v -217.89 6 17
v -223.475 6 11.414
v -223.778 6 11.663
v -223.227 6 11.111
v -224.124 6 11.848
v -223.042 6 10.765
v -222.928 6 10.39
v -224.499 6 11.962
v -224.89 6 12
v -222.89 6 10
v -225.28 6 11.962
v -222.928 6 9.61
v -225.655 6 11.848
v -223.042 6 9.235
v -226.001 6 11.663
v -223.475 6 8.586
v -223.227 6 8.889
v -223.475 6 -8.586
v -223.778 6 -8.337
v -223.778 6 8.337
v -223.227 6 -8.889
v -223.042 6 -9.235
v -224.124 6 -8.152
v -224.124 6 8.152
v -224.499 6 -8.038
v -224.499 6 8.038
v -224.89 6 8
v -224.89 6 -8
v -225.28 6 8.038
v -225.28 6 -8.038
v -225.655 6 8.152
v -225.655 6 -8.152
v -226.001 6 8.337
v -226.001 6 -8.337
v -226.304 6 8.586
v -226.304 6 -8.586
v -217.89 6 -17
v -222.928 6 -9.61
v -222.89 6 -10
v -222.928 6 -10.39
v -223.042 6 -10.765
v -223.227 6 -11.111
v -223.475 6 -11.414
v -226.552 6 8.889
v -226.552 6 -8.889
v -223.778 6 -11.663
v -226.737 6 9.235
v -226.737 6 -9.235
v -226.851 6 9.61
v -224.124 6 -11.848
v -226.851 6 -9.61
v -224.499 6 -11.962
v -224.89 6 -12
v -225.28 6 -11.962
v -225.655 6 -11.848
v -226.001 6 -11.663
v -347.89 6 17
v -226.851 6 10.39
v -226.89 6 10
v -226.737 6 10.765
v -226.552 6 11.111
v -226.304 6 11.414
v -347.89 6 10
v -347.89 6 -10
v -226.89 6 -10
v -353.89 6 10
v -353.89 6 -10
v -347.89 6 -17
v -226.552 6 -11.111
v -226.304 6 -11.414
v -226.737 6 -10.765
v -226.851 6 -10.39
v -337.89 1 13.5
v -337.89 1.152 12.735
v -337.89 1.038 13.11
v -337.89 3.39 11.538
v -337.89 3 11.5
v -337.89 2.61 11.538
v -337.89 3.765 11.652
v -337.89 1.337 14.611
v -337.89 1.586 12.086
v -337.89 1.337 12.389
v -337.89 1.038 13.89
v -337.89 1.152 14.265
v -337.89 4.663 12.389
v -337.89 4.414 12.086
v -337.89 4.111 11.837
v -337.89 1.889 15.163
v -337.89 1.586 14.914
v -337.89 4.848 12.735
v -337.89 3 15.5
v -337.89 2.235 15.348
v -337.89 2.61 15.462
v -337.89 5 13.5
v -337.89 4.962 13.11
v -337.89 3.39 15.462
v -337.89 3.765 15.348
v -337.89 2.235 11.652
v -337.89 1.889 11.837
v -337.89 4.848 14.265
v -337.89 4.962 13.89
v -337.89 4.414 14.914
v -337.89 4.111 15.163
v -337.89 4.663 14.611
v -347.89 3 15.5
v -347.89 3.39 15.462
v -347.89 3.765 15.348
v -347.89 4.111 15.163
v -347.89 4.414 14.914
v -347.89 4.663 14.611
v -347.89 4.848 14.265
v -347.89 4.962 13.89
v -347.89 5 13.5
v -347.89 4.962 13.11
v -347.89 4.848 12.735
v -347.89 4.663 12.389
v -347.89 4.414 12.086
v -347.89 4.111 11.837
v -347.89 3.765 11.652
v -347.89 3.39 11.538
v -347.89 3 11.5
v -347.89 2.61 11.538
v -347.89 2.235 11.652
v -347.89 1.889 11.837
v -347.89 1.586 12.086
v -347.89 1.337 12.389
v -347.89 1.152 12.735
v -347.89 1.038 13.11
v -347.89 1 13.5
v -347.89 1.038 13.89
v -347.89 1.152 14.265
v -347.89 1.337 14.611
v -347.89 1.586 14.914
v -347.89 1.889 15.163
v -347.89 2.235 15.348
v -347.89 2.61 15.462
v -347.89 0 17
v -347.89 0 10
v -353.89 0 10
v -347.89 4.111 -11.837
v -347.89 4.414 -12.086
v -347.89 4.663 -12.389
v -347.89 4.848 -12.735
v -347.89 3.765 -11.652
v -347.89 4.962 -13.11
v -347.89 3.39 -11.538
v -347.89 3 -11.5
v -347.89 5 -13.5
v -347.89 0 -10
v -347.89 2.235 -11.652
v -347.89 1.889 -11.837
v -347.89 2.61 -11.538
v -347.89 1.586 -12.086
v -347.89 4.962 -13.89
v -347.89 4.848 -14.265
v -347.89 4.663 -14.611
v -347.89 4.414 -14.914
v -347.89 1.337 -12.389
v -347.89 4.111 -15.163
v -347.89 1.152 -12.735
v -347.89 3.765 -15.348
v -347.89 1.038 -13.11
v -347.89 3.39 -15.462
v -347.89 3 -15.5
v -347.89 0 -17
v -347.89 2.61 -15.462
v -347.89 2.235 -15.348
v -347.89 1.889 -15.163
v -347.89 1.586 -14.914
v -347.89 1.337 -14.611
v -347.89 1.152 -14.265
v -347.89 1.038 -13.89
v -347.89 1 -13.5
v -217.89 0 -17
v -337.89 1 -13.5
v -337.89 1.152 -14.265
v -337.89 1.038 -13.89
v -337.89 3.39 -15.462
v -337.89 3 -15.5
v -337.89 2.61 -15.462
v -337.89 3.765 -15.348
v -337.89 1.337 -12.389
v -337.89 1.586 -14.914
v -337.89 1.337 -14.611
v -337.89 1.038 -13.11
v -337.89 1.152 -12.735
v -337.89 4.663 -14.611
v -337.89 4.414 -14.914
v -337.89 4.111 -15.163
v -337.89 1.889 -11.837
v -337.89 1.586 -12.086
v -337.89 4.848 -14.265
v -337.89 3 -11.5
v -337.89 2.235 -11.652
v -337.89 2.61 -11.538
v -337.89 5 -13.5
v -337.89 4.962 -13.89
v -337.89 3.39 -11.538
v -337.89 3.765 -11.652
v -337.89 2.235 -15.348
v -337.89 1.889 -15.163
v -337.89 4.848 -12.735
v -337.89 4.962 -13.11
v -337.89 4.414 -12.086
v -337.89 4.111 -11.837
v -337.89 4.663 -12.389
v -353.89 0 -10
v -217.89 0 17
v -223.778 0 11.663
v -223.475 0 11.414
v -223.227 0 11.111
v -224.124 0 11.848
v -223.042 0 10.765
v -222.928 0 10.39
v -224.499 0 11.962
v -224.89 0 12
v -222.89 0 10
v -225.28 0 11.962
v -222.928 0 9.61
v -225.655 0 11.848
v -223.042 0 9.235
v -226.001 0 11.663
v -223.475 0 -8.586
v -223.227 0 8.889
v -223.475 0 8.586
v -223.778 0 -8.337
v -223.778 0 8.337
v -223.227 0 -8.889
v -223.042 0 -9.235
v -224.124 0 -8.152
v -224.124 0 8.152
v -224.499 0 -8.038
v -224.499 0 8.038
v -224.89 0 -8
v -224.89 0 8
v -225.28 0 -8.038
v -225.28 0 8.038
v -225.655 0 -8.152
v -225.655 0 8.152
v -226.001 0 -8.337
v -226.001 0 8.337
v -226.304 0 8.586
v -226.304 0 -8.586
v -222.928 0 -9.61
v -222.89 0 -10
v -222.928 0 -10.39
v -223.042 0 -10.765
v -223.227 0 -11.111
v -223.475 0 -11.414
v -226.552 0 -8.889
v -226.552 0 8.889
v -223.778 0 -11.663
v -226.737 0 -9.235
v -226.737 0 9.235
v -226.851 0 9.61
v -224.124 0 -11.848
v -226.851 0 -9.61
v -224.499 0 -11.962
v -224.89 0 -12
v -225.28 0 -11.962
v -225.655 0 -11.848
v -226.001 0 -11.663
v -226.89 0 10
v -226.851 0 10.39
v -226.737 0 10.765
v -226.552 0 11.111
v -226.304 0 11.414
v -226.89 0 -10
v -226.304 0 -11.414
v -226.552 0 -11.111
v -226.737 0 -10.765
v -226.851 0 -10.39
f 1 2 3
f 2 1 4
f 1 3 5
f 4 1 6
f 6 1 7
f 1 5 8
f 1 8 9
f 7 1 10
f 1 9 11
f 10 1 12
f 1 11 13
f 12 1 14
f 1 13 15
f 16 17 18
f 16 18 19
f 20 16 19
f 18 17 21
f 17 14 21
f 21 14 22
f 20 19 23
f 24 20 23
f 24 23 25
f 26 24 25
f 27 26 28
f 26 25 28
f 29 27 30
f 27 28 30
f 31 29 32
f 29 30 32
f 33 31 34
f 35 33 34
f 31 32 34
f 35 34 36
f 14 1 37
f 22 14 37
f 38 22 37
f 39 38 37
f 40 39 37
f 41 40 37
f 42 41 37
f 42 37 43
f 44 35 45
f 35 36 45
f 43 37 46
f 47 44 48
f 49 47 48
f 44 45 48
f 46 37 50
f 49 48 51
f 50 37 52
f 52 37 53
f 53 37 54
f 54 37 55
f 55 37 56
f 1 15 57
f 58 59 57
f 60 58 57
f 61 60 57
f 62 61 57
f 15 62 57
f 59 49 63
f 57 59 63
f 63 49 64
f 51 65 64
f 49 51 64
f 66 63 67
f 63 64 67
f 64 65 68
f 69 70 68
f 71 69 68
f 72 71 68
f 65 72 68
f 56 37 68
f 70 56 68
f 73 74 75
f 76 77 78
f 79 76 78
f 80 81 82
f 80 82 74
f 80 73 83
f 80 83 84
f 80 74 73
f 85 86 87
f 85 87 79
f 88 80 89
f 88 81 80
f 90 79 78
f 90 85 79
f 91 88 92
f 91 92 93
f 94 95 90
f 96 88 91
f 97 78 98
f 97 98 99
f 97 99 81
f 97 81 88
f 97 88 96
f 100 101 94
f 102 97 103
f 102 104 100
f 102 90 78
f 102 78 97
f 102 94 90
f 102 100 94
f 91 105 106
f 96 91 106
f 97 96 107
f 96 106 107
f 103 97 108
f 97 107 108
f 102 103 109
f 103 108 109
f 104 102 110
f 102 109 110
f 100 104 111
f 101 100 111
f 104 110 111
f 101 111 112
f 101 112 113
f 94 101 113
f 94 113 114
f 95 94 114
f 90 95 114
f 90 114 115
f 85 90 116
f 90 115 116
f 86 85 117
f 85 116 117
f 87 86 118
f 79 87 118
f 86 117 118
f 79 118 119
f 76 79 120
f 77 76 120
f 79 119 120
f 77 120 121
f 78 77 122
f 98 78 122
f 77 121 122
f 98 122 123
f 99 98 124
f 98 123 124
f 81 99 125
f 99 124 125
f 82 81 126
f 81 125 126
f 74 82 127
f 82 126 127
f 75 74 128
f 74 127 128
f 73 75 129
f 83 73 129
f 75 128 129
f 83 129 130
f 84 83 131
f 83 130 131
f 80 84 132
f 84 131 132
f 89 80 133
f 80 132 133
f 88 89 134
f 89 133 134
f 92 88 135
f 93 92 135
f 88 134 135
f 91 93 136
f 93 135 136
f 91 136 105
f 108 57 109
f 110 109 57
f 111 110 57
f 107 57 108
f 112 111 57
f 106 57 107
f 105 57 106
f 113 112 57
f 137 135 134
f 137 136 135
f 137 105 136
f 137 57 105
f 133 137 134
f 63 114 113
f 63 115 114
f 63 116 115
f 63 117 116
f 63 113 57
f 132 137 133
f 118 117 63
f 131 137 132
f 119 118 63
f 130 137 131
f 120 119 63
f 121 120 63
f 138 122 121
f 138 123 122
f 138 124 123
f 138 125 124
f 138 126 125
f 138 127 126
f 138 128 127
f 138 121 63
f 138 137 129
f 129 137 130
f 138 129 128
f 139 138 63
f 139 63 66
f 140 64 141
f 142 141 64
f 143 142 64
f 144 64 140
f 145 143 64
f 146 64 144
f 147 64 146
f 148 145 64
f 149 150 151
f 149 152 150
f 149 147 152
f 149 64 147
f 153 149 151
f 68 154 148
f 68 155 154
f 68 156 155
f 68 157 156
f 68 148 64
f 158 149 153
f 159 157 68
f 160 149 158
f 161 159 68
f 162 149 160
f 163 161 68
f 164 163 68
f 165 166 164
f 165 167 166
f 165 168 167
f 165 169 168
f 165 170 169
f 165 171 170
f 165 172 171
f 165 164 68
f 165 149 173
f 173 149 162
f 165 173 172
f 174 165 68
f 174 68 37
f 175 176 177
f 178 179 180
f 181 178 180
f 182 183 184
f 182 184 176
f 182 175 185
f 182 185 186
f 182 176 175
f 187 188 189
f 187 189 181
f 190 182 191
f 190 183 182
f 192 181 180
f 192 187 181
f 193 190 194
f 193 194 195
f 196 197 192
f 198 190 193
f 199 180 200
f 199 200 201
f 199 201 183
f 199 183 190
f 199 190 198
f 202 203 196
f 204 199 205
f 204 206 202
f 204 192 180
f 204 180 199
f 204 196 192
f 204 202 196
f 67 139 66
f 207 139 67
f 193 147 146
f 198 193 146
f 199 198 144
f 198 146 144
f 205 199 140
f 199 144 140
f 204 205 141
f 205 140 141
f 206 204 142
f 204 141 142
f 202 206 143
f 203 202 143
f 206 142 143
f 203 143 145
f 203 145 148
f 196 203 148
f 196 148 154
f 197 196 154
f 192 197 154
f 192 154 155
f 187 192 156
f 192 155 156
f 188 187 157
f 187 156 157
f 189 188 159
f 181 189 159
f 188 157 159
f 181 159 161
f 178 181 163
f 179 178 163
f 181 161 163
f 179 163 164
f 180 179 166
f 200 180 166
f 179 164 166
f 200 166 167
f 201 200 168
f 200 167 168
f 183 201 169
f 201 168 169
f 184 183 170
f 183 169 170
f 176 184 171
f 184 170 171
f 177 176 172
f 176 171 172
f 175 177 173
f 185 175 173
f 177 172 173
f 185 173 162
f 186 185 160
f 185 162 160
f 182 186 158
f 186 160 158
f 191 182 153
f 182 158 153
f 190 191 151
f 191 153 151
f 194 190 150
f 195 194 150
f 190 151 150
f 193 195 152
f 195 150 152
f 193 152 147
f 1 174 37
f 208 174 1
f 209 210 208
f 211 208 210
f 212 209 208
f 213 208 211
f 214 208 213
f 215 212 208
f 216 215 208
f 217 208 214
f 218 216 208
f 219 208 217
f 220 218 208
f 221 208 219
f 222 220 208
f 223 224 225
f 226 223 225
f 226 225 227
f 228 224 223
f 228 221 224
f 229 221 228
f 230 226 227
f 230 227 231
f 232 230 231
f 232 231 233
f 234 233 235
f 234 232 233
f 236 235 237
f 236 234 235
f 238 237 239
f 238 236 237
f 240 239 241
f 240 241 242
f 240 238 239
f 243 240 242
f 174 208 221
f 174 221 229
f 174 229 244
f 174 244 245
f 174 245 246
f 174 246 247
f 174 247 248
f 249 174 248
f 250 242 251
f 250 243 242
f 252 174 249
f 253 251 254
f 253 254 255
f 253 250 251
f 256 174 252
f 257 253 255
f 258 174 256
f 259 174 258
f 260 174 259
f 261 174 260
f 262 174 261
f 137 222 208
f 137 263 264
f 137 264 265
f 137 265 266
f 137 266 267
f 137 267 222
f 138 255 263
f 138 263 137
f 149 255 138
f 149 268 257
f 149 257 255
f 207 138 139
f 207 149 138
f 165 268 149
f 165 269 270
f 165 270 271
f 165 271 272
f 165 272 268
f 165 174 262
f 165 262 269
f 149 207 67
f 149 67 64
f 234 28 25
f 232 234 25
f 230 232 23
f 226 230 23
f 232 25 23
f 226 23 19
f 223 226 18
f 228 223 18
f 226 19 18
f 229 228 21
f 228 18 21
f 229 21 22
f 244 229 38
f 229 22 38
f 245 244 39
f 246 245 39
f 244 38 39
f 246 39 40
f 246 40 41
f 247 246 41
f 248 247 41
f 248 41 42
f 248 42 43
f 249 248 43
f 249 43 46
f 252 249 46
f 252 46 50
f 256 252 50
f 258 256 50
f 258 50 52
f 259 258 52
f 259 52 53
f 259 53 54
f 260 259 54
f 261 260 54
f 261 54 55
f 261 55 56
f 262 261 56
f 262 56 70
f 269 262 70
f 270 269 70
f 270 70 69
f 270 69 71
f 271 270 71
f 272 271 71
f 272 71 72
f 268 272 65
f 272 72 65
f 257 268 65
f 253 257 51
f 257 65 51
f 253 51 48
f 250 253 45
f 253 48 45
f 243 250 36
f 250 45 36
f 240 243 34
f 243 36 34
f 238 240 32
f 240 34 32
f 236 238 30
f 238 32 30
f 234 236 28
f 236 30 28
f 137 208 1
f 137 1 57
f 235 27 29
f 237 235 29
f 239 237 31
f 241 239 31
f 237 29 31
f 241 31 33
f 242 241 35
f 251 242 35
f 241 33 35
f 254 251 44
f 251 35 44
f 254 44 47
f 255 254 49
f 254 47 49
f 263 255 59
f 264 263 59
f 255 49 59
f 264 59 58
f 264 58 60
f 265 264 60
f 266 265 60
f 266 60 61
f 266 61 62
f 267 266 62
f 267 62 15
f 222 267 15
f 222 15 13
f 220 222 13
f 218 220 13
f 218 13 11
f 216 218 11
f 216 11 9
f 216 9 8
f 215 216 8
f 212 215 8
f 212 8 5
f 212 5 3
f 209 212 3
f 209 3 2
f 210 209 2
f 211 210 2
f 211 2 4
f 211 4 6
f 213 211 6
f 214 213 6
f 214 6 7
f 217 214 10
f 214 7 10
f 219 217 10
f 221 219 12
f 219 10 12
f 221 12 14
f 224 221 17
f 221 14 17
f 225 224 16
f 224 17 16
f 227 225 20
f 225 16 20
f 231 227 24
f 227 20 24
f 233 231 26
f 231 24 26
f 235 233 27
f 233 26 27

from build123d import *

# Parameters (mm, degrees)
BOSS_EXTRU_1_DEPTH      = 6
ESQUISSE3_R             = 2
ENL_V_MAT_EXTRU_2_DEPTH = 10
ESQUISSE5_R             = 2
ENL_V_MAT_EXTRU_3_DEPTH = 355.348418967


with BuildPart() as part:
    # Esquisse2 → Boss.-Extru.1 (new body)
    with BuildSketch(Plane(origin=(0, 0, 0), x_dir=(1, 0, 0), z_dir=(0, 1, 0))):
        Polygon((-347.889533646, 17), (-217.889533646, 17), (-217.889533646, -17), (-347.889533646, -17), (-347.889533646, -10), (-353.889533646, -10), (-353.889533646, 10), (-347.889533646, 10), align=None)
    extrude(amount=BOSS_EXTRU_1_DEPTH)

    # Esquisse3 → Enlèv. mat.-Extru.2 (cut)
    with BuildSketch(Plane.ZY.offset(347.889533646)):
        with Locations((-13.5, 3)):
            Circle(ESQUISSE3_R)
        with Locations((13.5, 3)):
            Circle(ESQUISSE3_R)
    extrude(amount=-ENL_V_MAT_EXTRU_2_DEPTH, mode=Mode.SUBTRACT)

    # Esquisse5 → Enlèv. mat.-Extru.3 (cut, through all)
    with BuildSketch(Plane(origin=(0, 6, 0), x_dir=(1, 0, 0), z_dir=(0, 1, 0))):
        with Locations(Location((-224.889533646, 10, 0), (0, 0, 270))):
            Circle(ESQUISSE5_R)
        with Locations(Location((-224.889533646, -10, 0), (0, 0, 90))):
            Circle(ESQUISSE5_R)
    extrude(amount=-ENL_V_MAT_EXTRU_3_DEPTH, mode=Mode.SUBTRACT)


solid = part.part
